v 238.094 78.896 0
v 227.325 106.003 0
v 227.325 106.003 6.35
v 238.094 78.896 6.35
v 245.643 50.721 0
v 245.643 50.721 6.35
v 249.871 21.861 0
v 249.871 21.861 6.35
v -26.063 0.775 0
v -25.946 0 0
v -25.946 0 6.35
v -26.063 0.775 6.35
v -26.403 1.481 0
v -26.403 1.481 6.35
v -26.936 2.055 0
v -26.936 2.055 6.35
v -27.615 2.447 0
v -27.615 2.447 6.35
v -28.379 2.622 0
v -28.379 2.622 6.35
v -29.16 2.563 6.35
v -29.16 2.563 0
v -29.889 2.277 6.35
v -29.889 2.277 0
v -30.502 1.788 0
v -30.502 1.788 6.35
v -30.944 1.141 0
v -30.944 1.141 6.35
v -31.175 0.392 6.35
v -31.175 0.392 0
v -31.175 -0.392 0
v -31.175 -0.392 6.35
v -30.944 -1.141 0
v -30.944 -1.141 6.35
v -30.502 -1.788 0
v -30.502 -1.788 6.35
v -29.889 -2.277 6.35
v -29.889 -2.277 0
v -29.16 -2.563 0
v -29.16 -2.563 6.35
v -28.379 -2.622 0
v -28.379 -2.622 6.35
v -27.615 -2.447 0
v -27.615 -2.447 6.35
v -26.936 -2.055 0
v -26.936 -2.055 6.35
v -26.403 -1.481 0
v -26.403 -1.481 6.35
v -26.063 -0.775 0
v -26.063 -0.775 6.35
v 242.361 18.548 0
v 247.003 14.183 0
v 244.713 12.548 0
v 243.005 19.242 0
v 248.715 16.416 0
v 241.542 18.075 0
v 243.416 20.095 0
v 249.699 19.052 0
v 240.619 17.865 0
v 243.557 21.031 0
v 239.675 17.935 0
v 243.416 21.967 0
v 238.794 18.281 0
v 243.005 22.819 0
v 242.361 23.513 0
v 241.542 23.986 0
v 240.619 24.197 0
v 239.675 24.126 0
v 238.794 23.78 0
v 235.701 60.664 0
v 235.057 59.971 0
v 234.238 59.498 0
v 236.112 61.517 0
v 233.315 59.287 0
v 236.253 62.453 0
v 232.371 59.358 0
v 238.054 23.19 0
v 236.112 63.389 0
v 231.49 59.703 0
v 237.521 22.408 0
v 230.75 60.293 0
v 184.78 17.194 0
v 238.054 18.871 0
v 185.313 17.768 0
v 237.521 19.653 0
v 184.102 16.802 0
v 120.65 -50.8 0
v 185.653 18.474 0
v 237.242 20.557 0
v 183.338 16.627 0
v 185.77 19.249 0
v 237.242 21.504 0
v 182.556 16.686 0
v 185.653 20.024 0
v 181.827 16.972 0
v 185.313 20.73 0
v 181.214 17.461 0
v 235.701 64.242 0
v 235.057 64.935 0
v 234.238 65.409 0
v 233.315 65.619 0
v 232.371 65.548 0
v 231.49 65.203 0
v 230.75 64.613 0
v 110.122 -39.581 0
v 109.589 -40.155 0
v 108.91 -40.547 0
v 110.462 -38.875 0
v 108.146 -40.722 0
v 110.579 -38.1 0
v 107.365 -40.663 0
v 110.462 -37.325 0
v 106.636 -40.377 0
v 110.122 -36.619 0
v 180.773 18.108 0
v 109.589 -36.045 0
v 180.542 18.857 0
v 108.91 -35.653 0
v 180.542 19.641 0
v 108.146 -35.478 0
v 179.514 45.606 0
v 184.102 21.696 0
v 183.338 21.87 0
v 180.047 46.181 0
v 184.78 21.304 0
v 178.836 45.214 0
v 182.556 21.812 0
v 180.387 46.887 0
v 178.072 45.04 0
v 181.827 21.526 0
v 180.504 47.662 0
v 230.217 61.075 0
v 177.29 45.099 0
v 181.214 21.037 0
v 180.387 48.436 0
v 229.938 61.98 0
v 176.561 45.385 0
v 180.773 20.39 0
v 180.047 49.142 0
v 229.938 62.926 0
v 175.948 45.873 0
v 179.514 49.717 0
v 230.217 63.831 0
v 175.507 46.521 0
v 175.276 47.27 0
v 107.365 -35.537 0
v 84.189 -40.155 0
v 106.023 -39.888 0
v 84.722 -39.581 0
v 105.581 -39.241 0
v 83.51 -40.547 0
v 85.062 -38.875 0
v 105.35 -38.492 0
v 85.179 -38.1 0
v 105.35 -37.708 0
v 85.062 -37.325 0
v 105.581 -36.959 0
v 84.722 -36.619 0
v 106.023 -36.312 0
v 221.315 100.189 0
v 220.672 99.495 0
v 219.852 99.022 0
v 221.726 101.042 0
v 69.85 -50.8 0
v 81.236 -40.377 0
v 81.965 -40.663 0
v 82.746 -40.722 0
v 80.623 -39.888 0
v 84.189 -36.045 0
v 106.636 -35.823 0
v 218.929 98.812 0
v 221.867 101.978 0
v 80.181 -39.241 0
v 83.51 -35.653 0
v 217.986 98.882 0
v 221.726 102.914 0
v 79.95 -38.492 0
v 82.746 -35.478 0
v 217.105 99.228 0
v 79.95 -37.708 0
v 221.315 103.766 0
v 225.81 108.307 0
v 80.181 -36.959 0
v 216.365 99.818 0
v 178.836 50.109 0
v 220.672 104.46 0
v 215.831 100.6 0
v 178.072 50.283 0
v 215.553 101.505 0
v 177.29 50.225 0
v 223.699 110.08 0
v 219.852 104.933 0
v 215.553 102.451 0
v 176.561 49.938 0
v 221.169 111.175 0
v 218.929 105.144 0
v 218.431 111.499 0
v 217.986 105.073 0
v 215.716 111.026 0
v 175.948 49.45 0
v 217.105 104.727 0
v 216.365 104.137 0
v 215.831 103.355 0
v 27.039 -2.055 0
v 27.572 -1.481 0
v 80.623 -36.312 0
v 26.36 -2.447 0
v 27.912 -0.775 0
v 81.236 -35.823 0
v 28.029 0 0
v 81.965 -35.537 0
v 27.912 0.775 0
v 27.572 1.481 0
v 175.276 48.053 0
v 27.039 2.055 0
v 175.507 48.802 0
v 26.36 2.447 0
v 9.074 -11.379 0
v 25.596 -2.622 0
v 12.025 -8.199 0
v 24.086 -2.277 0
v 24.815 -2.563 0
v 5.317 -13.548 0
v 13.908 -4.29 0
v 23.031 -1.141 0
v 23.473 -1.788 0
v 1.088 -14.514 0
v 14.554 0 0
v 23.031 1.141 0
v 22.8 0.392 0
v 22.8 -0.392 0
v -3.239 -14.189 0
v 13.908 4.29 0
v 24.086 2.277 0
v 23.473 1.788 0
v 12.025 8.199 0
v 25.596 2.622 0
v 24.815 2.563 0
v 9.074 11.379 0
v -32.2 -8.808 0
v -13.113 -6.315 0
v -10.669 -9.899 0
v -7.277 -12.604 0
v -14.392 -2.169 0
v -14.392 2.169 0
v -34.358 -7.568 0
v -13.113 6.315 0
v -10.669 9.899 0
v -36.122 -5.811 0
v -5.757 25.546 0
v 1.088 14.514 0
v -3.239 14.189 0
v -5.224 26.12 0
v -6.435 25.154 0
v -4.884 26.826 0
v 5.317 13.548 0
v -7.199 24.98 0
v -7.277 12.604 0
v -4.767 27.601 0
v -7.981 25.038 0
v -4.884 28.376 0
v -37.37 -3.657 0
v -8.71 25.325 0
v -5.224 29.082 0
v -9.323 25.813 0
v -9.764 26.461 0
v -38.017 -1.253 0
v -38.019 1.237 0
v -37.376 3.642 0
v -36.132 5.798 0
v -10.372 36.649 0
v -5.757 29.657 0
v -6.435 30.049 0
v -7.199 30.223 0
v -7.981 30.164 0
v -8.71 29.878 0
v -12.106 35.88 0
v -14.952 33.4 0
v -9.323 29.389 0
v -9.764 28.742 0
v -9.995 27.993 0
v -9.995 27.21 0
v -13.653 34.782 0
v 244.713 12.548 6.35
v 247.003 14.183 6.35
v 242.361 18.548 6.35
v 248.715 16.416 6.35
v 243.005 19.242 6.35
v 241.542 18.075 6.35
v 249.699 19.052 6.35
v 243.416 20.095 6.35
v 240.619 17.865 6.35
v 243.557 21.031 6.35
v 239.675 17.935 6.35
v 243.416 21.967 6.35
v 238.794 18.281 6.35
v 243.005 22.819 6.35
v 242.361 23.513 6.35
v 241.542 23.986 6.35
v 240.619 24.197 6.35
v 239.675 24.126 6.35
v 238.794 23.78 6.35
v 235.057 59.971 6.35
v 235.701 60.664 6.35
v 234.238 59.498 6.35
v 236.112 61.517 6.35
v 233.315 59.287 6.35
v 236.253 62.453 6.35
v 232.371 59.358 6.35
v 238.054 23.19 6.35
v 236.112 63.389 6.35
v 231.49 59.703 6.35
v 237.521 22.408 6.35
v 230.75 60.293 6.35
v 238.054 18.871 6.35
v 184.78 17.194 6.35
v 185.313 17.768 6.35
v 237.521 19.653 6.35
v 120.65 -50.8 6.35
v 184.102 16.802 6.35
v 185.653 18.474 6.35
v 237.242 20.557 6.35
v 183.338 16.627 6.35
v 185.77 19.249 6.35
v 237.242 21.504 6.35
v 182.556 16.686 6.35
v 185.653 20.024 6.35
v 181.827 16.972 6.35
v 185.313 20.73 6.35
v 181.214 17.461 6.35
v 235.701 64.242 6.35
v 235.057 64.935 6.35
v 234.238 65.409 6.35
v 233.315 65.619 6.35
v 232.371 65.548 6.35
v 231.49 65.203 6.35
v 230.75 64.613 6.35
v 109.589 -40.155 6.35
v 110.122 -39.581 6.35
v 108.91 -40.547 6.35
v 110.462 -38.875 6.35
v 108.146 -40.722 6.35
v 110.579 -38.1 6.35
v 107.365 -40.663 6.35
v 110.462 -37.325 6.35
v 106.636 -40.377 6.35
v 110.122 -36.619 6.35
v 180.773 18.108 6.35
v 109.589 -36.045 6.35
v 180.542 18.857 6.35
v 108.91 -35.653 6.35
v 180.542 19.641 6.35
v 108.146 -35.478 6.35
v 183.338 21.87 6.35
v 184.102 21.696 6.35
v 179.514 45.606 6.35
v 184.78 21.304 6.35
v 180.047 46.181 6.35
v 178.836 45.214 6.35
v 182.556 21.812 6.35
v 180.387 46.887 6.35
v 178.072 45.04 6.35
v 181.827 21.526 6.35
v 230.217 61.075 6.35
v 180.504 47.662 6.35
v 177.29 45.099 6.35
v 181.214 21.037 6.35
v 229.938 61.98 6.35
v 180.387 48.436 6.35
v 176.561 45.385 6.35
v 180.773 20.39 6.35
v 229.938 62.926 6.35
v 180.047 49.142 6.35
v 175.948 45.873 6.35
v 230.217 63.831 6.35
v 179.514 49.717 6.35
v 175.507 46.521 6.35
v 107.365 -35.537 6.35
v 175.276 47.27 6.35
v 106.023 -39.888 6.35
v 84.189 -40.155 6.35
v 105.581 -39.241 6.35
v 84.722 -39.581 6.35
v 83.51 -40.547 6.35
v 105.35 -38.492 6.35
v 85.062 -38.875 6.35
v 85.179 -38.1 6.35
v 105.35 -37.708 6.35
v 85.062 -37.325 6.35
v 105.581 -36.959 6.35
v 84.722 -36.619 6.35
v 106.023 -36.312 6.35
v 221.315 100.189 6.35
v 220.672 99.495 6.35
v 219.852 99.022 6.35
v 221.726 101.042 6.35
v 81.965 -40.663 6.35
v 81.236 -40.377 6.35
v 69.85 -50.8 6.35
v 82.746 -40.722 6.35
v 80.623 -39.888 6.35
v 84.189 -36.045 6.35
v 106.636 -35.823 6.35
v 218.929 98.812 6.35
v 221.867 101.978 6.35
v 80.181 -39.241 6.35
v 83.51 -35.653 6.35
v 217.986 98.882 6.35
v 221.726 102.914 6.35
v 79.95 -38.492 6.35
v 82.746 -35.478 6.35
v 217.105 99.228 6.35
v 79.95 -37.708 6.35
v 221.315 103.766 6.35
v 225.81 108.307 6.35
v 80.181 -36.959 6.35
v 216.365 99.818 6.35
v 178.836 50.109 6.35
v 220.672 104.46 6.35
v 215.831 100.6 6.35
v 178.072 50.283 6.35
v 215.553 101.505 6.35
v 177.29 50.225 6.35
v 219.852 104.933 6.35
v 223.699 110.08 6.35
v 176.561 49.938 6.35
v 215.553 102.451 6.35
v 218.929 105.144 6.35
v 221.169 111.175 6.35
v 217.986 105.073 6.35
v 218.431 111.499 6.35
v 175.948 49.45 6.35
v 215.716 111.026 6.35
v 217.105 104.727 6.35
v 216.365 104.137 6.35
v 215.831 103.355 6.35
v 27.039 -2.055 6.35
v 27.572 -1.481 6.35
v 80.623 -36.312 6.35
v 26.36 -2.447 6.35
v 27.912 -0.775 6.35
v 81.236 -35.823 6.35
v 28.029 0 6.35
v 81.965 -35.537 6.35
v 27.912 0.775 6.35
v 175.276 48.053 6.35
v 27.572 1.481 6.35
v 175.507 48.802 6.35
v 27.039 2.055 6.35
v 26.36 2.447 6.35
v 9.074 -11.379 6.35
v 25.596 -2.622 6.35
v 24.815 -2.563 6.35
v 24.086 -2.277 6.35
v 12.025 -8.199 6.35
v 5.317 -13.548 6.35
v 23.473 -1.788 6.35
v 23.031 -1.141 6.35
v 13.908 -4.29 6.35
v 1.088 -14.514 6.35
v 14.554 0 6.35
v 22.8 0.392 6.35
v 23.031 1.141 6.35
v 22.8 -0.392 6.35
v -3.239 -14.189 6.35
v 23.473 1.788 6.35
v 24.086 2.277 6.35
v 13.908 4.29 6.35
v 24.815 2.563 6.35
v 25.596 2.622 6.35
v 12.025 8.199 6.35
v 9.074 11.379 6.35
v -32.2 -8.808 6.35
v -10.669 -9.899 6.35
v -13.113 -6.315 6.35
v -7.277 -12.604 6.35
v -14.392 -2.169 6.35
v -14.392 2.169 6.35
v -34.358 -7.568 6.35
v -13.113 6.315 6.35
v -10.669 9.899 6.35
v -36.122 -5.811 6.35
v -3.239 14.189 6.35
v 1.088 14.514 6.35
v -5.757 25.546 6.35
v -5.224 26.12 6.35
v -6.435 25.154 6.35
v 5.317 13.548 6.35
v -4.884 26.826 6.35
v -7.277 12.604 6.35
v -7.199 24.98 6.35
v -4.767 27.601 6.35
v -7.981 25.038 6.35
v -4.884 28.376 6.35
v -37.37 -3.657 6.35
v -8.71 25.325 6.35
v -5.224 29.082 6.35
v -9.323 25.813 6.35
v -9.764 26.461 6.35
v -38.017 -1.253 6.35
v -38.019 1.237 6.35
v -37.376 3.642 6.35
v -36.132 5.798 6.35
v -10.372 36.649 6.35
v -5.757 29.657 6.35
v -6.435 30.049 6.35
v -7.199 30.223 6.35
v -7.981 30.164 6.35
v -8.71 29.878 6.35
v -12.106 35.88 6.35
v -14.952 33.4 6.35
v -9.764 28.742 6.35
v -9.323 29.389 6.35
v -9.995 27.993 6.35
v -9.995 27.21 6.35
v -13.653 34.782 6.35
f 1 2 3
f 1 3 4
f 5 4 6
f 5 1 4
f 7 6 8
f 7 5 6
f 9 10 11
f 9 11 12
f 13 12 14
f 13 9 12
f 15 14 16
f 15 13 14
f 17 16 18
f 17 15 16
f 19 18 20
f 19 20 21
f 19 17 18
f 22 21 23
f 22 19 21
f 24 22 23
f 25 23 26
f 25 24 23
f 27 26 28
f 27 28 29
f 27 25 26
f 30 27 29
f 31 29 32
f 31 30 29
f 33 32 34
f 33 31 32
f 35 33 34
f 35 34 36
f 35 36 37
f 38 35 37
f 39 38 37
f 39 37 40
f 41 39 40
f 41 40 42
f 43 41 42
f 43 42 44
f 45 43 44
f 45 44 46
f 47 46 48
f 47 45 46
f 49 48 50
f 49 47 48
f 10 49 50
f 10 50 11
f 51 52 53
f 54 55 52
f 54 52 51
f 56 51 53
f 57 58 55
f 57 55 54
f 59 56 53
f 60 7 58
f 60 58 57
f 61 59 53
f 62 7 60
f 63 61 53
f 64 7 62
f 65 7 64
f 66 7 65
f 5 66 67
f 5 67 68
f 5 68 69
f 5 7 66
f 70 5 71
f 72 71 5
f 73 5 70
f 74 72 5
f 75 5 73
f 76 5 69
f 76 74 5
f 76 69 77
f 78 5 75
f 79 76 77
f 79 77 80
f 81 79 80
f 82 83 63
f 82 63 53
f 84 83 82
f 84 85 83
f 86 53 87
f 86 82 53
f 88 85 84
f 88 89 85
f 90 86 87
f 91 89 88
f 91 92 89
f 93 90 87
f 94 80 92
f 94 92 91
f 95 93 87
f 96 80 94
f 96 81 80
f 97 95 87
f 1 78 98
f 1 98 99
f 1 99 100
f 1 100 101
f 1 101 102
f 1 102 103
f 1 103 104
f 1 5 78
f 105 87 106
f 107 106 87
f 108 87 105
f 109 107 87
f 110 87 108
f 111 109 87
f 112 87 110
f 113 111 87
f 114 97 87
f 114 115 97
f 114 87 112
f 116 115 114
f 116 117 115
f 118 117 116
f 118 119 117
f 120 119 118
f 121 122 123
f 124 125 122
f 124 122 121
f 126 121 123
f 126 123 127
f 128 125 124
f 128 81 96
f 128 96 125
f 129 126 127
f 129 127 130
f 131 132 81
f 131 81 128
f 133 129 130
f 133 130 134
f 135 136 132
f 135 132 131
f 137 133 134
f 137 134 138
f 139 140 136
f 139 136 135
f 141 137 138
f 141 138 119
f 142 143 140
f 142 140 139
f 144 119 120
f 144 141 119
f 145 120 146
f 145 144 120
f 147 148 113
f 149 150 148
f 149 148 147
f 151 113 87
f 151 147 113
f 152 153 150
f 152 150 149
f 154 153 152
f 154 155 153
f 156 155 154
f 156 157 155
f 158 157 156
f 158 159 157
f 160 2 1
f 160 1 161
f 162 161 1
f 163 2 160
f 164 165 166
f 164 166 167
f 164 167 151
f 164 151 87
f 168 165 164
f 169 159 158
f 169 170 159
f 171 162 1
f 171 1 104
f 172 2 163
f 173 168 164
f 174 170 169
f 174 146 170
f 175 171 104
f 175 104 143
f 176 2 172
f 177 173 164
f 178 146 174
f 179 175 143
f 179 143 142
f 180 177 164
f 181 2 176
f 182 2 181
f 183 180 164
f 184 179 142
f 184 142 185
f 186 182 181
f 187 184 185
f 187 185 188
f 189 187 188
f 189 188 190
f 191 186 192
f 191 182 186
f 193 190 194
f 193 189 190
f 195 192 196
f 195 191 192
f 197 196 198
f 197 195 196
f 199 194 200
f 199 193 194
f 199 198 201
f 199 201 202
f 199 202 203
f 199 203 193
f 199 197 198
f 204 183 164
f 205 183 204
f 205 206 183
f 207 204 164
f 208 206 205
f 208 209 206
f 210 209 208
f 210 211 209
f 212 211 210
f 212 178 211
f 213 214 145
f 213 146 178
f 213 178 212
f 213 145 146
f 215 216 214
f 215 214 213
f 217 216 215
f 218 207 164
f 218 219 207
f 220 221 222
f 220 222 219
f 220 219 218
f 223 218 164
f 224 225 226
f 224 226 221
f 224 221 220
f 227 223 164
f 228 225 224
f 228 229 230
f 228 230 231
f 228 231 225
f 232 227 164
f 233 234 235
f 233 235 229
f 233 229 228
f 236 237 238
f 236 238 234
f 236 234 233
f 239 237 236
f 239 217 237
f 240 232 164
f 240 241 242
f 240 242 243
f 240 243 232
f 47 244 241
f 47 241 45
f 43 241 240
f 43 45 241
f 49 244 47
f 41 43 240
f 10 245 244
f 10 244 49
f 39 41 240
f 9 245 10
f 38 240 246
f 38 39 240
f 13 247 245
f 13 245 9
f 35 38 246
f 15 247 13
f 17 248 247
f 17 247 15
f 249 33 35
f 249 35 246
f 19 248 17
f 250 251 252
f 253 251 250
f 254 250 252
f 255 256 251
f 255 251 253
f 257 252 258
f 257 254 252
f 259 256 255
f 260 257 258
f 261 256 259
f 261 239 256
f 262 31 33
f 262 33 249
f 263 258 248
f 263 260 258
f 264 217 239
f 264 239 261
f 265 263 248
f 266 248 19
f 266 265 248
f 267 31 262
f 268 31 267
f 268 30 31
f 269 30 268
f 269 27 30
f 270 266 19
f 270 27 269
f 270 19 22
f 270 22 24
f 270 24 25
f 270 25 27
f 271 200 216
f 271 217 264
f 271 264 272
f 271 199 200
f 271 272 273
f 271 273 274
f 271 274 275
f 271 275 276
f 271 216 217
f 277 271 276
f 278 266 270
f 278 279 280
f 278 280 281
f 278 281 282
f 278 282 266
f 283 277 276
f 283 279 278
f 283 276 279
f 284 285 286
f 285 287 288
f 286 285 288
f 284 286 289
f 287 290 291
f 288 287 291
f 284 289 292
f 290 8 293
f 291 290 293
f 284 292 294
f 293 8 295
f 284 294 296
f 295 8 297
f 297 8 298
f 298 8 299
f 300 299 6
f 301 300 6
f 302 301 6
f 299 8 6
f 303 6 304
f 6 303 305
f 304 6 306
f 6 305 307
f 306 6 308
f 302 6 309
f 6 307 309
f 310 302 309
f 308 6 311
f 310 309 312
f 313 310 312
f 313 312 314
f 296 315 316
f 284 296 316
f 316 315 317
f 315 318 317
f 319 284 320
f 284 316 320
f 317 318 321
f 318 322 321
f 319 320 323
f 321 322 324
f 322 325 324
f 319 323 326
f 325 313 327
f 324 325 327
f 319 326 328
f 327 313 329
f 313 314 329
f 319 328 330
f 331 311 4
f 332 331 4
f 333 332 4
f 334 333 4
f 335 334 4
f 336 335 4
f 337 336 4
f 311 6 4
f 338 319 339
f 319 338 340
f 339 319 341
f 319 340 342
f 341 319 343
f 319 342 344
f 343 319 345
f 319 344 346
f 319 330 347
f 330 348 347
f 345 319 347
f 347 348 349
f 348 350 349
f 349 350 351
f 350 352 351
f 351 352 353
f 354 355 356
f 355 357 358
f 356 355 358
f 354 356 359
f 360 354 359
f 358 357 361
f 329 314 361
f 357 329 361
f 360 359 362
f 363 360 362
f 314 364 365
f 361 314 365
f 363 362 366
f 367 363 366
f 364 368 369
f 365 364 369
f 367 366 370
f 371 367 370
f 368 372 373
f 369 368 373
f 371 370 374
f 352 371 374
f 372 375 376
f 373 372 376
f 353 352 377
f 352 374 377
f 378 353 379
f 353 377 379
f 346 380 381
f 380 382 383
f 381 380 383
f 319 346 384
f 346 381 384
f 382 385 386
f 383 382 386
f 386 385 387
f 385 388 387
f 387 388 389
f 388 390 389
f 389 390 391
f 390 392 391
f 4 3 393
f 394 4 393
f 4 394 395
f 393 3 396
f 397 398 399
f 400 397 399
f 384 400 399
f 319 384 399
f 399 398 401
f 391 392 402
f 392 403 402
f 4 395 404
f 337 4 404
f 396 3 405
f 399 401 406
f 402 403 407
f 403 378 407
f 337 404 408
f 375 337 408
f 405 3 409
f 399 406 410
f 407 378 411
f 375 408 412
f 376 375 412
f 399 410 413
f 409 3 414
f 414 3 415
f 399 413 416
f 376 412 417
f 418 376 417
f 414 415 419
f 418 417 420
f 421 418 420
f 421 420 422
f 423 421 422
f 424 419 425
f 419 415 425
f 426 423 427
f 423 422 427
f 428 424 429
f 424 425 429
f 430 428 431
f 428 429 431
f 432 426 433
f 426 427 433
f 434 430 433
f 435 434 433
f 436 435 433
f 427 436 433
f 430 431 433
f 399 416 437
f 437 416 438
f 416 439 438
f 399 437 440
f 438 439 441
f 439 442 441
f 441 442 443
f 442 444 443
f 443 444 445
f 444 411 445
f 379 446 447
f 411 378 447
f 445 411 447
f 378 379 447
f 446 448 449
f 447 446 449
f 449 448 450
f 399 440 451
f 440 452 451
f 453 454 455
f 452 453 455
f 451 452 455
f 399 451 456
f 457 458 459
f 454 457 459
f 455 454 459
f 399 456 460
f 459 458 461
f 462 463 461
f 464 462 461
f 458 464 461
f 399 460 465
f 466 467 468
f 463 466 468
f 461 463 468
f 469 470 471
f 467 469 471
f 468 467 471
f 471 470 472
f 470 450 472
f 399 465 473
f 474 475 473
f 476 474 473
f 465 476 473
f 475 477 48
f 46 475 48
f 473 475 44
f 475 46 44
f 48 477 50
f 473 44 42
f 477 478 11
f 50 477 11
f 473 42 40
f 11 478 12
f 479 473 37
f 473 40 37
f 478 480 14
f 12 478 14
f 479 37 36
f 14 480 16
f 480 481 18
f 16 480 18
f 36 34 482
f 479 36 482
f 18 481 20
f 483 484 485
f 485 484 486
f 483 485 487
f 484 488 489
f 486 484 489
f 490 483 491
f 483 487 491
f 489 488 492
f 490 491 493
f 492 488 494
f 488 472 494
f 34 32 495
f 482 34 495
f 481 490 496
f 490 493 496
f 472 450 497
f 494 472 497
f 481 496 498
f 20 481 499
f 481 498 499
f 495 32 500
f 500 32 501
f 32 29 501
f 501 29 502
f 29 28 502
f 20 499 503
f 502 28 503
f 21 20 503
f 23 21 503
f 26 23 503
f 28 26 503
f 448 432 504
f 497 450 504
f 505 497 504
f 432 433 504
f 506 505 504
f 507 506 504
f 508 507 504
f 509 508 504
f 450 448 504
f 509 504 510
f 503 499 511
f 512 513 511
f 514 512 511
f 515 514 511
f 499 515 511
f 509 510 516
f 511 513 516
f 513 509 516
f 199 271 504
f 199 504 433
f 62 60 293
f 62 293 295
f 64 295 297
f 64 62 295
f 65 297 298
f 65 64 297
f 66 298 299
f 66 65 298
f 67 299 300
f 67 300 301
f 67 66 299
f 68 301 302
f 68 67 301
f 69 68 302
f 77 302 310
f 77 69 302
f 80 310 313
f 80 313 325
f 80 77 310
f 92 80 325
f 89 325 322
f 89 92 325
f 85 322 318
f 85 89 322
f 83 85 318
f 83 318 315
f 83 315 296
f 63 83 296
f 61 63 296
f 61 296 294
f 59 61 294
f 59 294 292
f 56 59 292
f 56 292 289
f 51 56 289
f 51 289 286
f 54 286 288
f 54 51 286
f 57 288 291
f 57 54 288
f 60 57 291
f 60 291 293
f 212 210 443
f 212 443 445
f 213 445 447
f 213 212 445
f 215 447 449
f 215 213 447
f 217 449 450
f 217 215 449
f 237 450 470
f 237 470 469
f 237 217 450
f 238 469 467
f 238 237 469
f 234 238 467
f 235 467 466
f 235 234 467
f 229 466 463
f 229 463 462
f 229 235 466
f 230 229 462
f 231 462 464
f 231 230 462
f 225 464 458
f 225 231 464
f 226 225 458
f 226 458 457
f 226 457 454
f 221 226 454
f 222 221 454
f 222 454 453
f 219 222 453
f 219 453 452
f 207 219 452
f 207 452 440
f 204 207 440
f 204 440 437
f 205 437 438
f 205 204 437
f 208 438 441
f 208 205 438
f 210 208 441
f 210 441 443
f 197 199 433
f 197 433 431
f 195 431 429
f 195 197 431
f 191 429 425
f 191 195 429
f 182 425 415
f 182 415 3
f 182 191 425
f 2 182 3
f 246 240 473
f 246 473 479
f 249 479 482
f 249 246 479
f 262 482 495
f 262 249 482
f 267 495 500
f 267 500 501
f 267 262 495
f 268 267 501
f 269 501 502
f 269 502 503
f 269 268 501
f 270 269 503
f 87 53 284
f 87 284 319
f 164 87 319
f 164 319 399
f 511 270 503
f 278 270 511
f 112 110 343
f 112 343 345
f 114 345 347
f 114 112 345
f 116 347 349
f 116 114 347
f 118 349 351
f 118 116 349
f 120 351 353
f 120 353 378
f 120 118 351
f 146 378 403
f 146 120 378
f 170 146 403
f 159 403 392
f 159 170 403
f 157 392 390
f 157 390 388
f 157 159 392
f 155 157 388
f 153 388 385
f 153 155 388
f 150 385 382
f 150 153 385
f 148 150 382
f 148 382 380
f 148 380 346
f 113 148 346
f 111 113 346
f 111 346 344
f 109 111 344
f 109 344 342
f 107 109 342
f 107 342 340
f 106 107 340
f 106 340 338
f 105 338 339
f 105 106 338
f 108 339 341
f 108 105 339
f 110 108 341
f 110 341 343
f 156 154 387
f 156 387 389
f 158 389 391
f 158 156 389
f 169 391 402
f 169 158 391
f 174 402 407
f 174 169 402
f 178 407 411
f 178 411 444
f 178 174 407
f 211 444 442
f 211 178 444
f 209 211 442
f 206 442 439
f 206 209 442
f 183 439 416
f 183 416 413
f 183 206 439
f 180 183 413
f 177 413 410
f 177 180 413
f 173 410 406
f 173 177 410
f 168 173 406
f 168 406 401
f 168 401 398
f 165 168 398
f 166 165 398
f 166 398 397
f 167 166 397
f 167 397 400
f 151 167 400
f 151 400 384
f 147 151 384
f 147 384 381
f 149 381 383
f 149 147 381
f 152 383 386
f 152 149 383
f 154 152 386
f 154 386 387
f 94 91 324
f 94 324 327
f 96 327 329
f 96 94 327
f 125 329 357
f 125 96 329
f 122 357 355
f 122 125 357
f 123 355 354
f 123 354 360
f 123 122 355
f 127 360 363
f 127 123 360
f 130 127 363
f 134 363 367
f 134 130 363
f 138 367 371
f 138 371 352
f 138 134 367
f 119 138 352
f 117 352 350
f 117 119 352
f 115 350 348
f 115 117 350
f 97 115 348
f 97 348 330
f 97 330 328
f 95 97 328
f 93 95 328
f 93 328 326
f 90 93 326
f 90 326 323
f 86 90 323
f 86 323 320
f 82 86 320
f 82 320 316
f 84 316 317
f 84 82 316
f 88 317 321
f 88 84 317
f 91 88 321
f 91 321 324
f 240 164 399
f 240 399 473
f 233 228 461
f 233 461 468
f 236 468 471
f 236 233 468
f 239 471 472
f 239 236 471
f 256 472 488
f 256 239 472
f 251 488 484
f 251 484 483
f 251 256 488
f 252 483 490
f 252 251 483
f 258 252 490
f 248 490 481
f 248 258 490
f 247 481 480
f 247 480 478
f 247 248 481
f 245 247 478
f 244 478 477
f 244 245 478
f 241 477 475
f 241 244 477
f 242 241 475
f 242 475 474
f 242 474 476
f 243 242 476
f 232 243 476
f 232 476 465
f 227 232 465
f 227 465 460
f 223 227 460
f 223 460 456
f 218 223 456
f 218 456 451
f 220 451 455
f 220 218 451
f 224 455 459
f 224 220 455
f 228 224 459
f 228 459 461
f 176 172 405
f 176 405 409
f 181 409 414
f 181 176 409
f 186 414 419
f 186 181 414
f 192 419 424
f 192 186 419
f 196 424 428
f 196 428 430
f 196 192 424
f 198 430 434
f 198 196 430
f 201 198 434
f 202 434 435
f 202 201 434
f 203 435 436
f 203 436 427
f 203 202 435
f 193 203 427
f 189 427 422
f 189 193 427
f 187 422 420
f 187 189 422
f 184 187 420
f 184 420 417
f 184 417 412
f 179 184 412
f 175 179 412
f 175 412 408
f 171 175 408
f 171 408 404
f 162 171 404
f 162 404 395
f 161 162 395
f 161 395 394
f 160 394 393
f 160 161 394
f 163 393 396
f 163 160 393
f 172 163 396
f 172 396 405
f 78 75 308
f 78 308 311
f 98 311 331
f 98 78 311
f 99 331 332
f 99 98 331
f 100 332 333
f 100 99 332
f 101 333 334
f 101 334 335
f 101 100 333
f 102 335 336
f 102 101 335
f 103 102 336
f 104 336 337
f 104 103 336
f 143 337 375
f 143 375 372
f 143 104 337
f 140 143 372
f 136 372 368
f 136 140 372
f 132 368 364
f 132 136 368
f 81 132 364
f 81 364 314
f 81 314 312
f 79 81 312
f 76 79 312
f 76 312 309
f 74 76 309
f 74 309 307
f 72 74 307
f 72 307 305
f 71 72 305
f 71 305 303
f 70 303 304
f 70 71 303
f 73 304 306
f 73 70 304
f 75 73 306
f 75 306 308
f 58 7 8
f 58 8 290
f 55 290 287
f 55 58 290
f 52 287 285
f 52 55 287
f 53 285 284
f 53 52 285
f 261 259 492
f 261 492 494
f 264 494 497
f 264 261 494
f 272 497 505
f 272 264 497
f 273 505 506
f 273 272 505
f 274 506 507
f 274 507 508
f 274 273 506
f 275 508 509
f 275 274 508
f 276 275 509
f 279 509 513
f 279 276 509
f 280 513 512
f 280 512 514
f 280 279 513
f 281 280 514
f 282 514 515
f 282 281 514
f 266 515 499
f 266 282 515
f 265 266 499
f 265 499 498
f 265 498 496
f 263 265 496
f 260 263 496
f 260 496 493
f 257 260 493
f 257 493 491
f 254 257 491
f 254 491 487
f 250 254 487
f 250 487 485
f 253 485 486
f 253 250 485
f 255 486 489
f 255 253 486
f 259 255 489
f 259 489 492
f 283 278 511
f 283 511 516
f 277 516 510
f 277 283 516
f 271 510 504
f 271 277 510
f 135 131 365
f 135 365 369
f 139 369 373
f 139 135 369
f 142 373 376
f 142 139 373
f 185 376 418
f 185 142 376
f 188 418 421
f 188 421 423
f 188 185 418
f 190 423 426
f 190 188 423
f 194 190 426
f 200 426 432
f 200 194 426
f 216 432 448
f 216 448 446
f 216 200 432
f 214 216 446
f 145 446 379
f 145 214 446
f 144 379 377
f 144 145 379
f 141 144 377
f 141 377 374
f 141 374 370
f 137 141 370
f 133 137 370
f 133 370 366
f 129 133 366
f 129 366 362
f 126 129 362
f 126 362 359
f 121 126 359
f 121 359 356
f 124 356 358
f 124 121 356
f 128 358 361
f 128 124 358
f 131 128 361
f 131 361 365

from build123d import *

# Parameters (mm, degrees)
SKETCH1_R           = 14.5542
SKETCH1_R_2         = 2.6289
SKETCH1_R_3         = 3.175
BOSS_EXTRUDE1_DEPTH = 6.35


with BuildPart() as part:
    # Sketch1 → Boss-Extrude1 (new body)
    with BuildSketch(Plane.XY):
        with BuildLine():
            Line((-36.131690566, 5.798452611), (-14.95244478, 33.399783098))
            ThreePointArc((-14.95244478, 33.399783098), (-12.907289703, 35.369766722), (-10.372281426, 36.649308755))
            Line((-10.372281426, 36.649308755), (215.715541799, 111.025764827))
            ThreePointArc((215.715541799, 111.025764827), (222.474160144, 110.71972065), (227.324650683, 106.003225501))
            ThreePointArc((227.324650683, 106.003225501), (242.278345379, 64.918286988), (249.870535149, 21.860839175))
            ThreePointArc((249.870535149, 21.860839175), (248.714513601, 16.416443349), (244.713320148, 12.547556856))
            Line((244.713320148, 12.547556856), (120.65, -50.8))
            Line((120.65, -50.8), (69.85, -50.8))
            Line((69.85, -50.8), (-32.199514598, -8.808434533))
            ThreePointArc((-32.199514598, -8.808434533), (-37.772560831, -2.475984603), (-36.131690566, 5.798452611))
        make_face()
        Circle(SKETCH1_R, mode=Mode.SUBTRACT)
        with Locations((-28.575, 0)):
            Circle(SKETCH1_R_2, mode=Mode.SUBTRACT)
        with Locations((-7.395754214, 27.601330486)):
            Circle(SKETCH1_R_2, mode=Mode.SUBTRACT)
        with Locations((240.38178065, 21.030680725)):
            Circle(SKETCH1_R_3, mode=Mode.SUBTRACT)
        with Locations((233.077901884, 62.453035583)):
            Circle(SKETCH1_R_3, mode=Mode.SUBTRACT)
        with Locations((218.692069012, 101.977786558)):
            Circle(SKETCH1_R_3, mode=Mode.SUBTRACT)
        with Locations((82.55, -38.1)):
            Circle(SKETCH1_R_2, mode=Mode.SUBTRACT)
        with Locations((107.95, -38.1)):
            Circle(SKETCH1_R_2, mode=Mode.SUBTRACT)
        with Locations((25.4, 0)):
            Circle(SKETCH1_R_2, mode=Mode.SUBTRACT)
        with Locations((177.875240911, 47.661527156)):
            Circle(SKETCH1_R_2, mode=Mode.SUBTRACT)
        with Locations((183.141207032, 19.248916511)):
            Circle(SKETCH1_R_2, mode=Mode.SUBTRACT)
    extrude(amount=BOSS_EXTRUDE1_DEPTH)


solid = part.part
